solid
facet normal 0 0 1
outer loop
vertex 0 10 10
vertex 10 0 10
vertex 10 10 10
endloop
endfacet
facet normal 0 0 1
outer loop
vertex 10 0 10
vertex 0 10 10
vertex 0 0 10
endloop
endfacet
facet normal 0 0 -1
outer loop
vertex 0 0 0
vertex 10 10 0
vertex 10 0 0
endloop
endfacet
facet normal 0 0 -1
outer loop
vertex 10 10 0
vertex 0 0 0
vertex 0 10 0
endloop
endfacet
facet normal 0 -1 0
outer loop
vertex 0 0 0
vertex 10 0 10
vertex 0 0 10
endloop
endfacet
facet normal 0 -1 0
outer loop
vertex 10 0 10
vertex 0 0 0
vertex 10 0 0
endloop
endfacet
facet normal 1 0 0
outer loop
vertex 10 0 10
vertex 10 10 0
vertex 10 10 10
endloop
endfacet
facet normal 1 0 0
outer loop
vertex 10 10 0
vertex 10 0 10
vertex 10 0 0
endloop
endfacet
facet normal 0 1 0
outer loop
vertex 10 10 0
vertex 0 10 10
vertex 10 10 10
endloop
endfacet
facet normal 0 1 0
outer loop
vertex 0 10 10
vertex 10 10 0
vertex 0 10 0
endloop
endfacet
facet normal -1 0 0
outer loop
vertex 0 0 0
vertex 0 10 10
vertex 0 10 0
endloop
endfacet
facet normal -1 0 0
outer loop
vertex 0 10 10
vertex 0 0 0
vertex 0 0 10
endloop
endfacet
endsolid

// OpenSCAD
// Fixture: enough console output that the log must scroll in both
// interfaces, so scroll position can be asserted rather than mere presence.
// The last echo is a distinct marker, which is what "the newest line" means
// in these tests.

/*[Dimensions]*/
size = 10; // [5:50]

for (i = [1:40]) echo(str("tail-line-", i));
echo(str("tail-newest-marker"));

cube([size, size, size]);
